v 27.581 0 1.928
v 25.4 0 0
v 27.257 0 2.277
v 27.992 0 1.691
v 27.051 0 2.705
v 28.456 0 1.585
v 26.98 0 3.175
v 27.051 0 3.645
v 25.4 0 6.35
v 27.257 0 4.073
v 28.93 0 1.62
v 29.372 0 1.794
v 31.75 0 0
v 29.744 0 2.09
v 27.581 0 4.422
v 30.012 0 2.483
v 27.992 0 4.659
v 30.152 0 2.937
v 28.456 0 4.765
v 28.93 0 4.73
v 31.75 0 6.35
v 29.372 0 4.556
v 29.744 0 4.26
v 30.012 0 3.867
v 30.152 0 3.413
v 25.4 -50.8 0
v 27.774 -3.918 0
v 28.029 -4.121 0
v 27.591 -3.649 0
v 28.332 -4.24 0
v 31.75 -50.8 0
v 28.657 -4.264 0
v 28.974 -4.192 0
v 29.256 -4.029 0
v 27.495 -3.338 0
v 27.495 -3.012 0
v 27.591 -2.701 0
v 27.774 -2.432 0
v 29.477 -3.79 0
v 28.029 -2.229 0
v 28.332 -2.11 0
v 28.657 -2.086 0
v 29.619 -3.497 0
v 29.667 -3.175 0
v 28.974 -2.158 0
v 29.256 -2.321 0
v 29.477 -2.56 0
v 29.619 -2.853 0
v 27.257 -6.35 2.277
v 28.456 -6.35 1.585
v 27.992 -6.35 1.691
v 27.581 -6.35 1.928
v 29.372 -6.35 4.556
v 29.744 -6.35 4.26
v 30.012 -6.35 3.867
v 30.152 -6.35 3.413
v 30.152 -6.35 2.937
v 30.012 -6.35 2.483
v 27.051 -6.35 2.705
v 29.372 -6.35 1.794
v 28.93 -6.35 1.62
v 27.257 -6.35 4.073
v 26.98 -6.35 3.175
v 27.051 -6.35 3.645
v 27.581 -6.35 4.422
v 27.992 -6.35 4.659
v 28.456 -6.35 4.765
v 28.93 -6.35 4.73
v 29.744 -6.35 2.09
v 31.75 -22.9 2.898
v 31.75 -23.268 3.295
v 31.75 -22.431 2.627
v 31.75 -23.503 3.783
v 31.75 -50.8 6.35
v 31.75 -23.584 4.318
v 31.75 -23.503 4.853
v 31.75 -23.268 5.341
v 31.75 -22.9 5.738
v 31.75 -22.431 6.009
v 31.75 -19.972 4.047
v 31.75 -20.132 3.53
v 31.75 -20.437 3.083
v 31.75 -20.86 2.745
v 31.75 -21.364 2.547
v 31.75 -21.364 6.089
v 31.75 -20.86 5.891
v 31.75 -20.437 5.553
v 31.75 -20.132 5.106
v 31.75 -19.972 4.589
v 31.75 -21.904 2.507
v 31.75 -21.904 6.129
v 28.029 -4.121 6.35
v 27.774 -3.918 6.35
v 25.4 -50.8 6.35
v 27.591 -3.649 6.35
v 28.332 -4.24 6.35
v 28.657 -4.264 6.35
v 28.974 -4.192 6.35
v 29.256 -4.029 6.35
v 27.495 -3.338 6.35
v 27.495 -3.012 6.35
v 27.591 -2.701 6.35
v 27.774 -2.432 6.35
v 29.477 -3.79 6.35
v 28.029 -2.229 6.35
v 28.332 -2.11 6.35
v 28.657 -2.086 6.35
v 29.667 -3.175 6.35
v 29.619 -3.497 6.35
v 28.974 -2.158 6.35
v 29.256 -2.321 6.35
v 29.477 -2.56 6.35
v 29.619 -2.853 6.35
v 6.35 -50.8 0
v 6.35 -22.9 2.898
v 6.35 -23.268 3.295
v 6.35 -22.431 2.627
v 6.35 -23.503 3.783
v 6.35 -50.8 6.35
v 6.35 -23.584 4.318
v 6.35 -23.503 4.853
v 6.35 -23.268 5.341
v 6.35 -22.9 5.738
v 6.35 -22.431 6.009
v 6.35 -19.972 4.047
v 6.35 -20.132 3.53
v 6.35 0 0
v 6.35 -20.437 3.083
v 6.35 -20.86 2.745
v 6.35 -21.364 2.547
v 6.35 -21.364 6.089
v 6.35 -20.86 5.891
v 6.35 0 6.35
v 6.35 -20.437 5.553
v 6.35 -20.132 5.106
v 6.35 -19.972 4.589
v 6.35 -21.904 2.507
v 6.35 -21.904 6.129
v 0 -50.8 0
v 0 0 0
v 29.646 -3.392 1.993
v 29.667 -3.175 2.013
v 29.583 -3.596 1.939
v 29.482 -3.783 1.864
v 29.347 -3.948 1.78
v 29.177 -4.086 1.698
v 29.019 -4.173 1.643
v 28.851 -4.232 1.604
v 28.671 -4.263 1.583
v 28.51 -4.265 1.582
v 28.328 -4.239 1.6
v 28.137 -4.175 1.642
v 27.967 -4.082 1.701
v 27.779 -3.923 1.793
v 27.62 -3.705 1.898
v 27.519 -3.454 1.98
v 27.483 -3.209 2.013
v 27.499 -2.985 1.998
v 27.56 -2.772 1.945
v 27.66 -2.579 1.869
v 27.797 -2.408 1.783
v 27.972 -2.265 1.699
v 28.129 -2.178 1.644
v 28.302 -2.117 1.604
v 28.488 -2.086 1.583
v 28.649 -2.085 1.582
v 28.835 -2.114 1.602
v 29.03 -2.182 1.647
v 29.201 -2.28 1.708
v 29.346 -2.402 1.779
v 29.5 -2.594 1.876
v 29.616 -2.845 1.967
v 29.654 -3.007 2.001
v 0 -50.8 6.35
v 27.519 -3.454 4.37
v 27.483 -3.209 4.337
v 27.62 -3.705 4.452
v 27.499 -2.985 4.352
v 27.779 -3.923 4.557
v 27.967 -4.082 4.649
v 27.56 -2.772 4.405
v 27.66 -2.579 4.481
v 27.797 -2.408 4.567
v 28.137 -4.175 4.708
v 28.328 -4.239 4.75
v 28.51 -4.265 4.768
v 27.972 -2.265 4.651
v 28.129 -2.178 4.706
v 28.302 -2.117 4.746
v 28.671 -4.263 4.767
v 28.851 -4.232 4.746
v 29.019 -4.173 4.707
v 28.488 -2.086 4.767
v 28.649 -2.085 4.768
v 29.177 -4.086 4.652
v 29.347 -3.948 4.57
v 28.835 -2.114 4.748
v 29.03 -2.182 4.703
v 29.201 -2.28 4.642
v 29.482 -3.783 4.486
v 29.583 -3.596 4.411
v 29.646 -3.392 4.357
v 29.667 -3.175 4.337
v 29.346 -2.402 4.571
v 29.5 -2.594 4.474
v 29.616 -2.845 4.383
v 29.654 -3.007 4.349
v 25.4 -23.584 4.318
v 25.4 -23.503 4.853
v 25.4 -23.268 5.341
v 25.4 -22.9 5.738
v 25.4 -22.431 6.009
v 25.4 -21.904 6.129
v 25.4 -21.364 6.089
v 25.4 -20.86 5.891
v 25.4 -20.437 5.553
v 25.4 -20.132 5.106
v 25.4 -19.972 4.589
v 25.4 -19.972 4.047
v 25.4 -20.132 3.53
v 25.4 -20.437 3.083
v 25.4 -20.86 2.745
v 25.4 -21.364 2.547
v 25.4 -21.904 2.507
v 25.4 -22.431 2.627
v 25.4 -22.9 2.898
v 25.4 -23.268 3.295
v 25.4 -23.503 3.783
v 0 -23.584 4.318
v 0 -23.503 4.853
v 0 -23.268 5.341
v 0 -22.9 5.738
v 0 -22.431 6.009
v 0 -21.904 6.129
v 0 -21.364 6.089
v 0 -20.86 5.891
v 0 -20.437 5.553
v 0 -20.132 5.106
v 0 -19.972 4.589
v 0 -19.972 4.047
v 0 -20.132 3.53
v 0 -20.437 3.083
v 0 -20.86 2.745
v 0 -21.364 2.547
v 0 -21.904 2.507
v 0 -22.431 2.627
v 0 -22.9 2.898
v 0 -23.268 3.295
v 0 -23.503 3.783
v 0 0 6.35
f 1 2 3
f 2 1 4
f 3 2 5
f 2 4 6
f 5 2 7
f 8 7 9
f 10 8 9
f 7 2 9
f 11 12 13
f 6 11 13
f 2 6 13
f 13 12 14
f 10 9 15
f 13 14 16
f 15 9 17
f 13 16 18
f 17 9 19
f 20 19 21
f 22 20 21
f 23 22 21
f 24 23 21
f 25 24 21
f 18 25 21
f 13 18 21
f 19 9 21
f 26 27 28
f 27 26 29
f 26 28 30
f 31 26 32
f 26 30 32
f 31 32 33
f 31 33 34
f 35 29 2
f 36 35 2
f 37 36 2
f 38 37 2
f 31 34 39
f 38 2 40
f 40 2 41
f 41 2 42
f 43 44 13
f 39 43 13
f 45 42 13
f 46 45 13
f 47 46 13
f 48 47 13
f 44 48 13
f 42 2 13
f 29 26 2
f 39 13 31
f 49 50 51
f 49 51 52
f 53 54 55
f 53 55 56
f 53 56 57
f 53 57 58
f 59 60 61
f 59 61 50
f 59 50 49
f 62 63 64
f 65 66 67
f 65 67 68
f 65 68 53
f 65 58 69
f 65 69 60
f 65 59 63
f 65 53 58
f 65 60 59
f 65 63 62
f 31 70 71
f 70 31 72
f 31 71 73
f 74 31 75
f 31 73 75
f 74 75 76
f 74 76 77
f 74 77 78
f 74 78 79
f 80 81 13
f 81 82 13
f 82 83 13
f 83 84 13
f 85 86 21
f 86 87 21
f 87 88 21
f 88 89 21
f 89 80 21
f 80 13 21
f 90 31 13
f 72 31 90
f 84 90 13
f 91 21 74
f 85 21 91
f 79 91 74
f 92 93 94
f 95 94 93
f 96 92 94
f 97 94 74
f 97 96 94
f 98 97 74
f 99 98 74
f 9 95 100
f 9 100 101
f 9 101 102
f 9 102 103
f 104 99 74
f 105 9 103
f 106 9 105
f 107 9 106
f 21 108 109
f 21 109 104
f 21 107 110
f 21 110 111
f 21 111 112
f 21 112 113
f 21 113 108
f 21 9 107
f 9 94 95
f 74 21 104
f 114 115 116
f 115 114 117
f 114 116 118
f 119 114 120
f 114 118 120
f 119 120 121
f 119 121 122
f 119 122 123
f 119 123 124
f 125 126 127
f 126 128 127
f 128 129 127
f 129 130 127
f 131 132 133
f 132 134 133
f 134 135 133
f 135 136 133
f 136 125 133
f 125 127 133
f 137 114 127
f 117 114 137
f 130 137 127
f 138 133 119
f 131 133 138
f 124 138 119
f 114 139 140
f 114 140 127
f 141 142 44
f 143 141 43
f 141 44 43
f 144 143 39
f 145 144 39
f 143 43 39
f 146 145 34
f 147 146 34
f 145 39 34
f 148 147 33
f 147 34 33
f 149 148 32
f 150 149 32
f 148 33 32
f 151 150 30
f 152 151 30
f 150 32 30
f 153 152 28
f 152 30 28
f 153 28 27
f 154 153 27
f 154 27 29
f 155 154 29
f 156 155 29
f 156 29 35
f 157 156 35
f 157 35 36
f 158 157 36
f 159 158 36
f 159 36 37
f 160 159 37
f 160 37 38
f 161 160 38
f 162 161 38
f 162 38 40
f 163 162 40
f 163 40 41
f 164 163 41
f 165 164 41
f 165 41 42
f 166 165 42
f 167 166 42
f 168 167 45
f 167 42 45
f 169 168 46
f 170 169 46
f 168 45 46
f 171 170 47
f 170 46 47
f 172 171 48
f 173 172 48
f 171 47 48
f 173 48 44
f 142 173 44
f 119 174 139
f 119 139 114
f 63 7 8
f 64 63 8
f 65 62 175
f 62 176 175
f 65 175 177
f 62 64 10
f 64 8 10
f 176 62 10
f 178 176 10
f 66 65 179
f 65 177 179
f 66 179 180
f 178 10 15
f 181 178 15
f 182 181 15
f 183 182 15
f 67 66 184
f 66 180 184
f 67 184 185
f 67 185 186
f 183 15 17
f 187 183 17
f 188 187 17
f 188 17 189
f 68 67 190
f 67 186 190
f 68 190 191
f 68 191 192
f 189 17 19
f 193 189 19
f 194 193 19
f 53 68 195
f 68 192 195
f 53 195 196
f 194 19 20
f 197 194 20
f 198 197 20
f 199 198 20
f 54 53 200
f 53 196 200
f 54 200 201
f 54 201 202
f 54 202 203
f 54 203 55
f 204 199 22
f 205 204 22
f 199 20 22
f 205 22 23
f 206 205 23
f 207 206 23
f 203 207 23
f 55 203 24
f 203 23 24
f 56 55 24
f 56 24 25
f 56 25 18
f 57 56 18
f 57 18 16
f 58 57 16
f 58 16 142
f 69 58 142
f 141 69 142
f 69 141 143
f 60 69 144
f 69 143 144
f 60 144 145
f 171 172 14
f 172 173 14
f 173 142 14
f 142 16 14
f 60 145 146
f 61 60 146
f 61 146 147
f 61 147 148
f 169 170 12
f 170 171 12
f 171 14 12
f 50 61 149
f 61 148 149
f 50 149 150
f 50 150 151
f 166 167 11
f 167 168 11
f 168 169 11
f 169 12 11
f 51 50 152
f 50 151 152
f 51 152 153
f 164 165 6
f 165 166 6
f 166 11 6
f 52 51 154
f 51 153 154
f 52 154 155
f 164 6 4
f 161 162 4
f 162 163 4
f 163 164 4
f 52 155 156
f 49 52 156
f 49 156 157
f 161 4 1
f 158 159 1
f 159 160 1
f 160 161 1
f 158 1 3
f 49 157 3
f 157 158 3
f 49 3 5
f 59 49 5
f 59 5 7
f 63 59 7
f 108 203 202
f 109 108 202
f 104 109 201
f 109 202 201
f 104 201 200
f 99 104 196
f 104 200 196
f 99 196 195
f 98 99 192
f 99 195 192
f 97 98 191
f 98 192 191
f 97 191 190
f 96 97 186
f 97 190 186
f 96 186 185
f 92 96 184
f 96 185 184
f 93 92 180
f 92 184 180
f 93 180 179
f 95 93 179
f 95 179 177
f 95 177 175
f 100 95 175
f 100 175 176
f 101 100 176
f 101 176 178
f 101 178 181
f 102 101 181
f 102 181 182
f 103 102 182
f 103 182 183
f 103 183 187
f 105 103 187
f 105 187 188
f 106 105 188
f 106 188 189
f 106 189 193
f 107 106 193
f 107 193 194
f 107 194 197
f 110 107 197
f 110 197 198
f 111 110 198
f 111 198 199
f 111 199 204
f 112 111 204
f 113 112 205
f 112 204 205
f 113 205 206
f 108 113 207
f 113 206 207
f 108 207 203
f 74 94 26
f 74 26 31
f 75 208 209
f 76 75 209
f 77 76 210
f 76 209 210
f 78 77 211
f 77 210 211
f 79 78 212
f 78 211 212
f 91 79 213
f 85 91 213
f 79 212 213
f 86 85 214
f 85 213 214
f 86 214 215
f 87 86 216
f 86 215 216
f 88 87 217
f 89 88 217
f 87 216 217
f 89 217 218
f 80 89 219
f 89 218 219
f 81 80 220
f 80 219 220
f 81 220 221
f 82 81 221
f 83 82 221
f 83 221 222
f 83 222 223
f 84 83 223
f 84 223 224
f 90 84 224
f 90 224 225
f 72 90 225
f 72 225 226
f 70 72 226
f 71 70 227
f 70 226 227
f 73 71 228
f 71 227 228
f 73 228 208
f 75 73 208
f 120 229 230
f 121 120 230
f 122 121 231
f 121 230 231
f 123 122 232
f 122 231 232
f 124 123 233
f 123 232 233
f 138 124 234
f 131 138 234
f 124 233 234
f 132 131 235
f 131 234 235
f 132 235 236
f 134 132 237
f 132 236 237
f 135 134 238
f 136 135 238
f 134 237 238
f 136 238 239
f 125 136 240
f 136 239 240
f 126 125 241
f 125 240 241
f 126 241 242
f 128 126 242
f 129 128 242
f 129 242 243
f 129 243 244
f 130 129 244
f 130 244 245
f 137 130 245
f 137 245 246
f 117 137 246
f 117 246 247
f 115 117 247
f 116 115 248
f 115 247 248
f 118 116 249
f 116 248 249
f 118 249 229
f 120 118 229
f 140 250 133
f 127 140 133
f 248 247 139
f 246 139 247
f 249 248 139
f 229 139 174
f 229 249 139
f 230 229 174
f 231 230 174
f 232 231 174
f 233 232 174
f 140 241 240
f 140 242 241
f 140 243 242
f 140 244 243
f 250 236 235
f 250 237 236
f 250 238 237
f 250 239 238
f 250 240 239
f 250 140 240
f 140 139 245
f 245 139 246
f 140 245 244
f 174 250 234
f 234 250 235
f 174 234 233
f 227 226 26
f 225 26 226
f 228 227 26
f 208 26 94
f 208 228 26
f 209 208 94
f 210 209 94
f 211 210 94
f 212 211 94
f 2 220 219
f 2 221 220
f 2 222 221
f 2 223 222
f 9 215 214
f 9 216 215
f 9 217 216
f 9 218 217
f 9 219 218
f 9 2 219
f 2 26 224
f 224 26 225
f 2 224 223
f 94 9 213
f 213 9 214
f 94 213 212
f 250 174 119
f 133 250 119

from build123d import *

# Parameters (mm, degrees)
F0_W     = 6.35
F0_H     = 6.35
F1_DEPTH = 50.8
F2_R     = 1.8161
F3_DEPTH = 6.35
F5_R     = 1.594614
F6_DEPTH = 6.35
F7_R     = 118.519935
F7_R_2   = 1.0922
F8_DEPTH = 25.4


with BuildPart() as f1:
    # F0 (on Front) → F1 (new body)
    with BuildSketch(Plane.XZ):
        with Locations((3.175, 3.175)):
            Rectangle(F0_W, F0_H)
    extrude(amount=F1_DEPTH)

    # F2 (on face) → F3 (cut, through all)
    with BuildSketch(Plane(origin=(0, 0, 0), x_dir=(0, -1, 0), z_dir=(-1, 0, 0))):
        with Locations((21.7678, 4.318)):
            Circle(F2_R)
    extrude(amount=-F3_DEPTH, mode=Mode.SUBTRACT)


with BuildPart() as f4_1:
    # F4: copy of F1
    add(f1.part.moved(Location((25.4, 0, 0))))

    # F5 (on face) → F6 (cut)
    with BuildSketch(Plane(origin=(0, 0, 0), x_dir=(-1, 0, 0), z_dir=(0, 1, 0))):
        with Locations((-28.575, 3.175)):
            Circle(F5_R)
    extrude(amount=-F6_DEPTH, mode=Mode.SUBTRACT)

    # F7 (on face) → F8 (cut)
    with BuildSketch(Plane(origin=(0, 0, 0), x_dir=(1, 0, 0), z_dir=(0, 0, -1))):
        with Locations((-40.215876, -233.822033)):
            Circle(F7_R)
        with Locations((28.575, 3.175)):
            Circle(F7_R_2)
    extrude(amount=-F8_DEPTH, mode=Mode.SUBTRACT)


solid = Compound([f1.part, f4_1.part])
